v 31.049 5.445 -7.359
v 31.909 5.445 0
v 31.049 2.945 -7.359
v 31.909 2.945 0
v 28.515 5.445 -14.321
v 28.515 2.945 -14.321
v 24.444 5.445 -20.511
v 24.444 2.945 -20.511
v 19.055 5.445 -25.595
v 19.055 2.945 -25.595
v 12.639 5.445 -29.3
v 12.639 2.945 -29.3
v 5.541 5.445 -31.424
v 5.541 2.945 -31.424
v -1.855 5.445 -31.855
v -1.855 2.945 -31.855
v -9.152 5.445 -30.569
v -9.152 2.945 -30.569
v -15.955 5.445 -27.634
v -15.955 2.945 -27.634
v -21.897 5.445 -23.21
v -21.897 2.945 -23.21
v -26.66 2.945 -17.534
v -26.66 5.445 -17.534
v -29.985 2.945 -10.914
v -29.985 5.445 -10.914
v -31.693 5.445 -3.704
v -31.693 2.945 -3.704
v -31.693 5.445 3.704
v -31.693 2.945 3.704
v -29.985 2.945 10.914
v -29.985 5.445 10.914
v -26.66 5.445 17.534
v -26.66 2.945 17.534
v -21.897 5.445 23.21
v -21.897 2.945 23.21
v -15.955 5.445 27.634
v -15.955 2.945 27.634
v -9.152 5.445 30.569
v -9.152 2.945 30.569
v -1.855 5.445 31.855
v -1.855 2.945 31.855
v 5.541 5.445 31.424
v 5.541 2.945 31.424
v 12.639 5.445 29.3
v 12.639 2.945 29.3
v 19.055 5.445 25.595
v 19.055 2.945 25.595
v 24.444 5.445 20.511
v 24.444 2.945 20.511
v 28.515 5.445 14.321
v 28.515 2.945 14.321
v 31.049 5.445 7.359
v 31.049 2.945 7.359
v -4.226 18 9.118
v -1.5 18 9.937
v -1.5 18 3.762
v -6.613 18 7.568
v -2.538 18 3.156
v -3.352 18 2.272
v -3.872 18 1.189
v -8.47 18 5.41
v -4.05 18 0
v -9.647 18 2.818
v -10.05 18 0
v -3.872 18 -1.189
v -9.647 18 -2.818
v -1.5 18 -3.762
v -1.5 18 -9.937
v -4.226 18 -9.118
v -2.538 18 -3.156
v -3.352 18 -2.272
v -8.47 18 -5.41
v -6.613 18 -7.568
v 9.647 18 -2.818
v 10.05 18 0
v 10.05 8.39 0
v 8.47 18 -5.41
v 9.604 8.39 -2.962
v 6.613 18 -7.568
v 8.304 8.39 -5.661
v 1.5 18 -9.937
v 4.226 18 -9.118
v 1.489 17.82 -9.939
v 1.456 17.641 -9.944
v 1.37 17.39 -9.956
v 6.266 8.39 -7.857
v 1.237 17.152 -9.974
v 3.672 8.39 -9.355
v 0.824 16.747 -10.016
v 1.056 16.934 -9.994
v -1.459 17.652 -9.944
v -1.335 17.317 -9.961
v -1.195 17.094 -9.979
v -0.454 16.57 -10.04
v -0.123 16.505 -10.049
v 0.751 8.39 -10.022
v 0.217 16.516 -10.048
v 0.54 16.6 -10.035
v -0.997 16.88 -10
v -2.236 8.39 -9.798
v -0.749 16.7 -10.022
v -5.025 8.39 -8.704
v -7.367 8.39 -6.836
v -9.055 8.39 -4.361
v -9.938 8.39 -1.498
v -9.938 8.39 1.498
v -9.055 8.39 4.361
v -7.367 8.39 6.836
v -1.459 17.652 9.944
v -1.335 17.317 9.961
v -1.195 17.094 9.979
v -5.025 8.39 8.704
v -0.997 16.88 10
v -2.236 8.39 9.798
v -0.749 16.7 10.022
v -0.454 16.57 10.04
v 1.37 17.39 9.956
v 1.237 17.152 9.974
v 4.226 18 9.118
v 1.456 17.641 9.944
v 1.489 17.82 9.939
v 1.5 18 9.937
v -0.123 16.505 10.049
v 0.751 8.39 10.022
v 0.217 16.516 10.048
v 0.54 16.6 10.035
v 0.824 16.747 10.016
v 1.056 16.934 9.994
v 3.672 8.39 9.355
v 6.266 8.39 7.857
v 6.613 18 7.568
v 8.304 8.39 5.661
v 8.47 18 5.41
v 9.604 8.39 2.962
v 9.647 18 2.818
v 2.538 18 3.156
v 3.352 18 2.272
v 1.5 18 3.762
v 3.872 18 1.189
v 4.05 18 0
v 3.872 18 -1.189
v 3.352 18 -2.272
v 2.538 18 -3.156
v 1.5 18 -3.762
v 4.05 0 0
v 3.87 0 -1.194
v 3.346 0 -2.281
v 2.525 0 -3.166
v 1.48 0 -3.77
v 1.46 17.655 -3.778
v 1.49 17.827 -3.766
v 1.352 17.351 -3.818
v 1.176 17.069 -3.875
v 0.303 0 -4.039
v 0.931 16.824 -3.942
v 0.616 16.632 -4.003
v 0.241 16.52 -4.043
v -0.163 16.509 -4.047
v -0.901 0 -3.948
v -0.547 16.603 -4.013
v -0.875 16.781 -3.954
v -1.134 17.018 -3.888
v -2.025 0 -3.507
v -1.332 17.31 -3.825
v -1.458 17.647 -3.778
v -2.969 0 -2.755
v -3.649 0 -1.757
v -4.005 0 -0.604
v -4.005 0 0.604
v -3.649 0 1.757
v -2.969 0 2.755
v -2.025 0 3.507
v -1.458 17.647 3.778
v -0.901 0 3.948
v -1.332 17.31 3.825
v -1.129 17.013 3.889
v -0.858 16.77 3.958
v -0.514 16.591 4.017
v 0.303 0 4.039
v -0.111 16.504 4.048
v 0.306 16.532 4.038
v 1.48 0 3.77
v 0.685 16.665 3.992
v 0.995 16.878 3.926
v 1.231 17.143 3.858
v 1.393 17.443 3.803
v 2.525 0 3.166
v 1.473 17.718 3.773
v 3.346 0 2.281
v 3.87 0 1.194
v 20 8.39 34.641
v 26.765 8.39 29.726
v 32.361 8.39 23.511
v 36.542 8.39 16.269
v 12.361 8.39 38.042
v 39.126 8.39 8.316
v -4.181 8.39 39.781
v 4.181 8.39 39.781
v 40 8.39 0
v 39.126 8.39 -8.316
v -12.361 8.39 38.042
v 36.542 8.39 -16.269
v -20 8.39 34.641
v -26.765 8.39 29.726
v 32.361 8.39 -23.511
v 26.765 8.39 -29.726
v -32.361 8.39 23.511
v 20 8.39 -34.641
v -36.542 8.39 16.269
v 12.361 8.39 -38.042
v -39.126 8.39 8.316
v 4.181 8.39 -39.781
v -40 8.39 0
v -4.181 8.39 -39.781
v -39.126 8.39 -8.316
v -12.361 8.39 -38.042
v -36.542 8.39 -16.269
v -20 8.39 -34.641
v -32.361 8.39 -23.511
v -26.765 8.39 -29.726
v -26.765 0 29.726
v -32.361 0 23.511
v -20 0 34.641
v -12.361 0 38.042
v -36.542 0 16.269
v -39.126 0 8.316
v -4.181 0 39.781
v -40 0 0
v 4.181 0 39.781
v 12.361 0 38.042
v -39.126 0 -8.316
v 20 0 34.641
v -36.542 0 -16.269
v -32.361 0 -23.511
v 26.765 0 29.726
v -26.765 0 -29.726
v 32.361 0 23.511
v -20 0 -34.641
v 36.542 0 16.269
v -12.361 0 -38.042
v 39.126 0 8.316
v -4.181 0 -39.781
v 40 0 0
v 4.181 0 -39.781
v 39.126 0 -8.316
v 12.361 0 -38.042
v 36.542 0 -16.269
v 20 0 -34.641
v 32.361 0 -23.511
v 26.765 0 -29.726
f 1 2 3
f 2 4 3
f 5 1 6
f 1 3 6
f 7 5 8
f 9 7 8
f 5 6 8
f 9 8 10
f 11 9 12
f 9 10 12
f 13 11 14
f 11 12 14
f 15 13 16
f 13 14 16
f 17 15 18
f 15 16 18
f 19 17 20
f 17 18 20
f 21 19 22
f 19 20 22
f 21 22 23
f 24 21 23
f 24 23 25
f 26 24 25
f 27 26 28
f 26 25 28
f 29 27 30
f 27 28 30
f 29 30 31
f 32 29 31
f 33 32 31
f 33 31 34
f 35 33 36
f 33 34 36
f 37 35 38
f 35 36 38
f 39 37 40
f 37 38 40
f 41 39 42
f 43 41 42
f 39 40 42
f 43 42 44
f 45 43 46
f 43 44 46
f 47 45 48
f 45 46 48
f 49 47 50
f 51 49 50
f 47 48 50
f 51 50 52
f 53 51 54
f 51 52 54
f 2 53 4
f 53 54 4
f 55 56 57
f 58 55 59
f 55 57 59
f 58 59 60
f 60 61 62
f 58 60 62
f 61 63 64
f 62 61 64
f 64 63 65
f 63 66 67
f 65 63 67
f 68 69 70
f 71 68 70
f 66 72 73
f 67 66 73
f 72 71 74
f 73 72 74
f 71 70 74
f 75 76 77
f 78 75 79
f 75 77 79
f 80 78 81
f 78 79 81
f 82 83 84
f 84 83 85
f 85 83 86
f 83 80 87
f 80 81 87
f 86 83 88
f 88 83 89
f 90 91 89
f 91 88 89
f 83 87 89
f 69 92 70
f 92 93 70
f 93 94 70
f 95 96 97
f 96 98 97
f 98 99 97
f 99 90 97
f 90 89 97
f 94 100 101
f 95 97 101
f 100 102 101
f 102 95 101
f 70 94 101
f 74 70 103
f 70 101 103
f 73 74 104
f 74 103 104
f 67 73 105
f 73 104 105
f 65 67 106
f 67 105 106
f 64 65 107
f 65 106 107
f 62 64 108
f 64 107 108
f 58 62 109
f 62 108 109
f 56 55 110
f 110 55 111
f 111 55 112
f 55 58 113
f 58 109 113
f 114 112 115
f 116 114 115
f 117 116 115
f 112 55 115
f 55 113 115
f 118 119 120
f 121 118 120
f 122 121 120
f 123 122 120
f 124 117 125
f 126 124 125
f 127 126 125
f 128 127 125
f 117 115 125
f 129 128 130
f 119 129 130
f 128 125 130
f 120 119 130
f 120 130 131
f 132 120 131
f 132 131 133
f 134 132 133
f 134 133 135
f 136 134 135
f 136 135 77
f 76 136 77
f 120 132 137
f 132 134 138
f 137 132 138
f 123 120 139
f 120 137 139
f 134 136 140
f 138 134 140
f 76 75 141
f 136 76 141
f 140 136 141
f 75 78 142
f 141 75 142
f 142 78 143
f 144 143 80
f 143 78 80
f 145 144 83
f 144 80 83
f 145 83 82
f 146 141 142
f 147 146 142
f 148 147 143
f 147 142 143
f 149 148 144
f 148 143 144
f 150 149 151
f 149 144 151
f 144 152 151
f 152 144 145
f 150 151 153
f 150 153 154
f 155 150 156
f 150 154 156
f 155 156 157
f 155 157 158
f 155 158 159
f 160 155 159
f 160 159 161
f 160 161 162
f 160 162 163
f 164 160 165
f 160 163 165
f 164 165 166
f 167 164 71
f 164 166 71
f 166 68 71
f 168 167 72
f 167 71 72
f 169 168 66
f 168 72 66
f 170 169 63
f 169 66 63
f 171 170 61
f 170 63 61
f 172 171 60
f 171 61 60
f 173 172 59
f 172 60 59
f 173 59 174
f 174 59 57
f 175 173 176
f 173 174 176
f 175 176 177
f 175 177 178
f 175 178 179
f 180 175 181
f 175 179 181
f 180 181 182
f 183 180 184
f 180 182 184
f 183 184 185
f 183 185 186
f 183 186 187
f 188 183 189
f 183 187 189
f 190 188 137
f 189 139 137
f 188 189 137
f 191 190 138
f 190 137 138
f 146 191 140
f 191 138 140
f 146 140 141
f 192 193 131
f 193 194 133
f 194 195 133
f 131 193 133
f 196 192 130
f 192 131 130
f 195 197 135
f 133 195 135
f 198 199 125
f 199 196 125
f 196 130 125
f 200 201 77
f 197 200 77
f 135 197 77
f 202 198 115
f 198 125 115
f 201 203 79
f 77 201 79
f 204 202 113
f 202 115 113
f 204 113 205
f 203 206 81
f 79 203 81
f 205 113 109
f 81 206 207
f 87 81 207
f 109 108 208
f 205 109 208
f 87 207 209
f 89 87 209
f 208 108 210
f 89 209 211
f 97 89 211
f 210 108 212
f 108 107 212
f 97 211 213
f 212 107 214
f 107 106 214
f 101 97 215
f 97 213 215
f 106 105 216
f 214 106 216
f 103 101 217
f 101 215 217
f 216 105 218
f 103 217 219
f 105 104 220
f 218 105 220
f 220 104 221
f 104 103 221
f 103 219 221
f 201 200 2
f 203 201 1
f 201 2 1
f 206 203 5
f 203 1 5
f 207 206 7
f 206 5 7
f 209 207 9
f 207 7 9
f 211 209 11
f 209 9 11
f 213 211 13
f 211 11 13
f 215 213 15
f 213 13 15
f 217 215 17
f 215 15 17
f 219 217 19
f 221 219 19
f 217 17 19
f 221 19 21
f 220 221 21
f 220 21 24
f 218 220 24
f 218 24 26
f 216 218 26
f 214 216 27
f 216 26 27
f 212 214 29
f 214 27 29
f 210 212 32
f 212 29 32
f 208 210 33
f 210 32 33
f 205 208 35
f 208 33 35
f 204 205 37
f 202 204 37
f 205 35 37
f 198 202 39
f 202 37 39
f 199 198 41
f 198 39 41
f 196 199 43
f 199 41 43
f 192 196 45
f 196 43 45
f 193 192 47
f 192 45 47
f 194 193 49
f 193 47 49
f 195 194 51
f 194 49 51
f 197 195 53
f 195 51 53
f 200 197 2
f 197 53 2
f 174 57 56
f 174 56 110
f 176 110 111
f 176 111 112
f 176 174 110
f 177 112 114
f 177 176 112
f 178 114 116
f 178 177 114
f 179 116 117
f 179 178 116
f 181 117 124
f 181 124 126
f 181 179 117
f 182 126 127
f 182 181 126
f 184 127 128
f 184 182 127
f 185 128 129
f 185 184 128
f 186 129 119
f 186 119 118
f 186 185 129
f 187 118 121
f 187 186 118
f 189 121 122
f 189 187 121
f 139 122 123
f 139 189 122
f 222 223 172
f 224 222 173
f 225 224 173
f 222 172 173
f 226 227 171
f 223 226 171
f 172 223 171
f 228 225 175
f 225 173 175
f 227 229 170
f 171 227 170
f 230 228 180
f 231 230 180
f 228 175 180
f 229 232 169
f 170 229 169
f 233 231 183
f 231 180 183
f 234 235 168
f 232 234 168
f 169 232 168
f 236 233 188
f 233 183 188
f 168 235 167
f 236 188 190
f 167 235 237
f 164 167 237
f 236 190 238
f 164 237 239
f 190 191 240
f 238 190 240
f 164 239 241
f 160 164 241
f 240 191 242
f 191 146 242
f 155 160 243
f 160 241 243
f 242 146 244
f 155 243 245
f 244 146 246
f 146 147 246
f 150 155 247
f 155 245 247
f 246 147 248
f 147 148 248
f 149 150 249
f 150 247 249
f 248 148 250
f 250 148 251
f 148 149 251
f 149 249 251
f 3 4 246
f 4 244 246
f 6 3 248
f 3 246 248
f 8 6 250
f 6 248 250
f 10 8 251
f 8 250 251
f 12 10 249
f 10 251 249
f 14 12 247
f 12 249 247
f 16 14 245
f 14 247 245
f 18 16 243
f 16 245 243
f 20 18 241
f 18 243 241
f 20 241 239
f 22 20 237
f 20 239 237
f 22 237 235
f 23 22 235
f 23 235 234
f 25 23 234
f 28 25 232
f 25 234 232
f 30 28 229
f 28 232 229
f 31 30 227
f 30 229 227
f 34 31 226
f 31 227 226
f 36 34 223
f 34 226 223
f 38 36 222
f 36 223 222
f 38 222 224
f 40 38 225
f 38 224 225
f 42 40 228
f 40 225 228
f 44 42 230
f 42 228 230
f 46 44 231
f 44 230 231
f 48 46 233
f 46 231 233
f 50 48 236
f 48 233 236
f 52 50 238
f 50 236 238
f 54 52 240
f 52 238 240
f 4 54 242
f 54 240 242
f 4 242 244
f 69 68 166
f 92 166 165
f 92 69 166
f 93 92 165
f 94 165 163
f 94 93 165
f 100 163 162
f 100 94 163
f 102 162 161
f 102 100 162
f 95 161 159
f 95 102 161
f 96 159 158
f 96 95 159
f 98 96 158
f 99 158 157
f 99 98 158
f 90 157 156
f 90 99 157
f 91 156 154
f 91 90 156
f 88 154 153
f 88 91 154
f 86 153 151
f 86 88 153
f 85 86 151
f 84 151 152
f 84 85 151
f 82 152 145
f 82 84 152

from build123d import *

# Parameters (mm, degrees)
CYLINDER_R     = 1.5
CYLINDER_DEPTH = 22


with BuildPart() as cylinder:
    # Cylinder → Cylinder (new body)
    with BuildSketch(Plane(origin=(0, 18, -11), x_dir=(1, 0, 0), z_dir=(0, 0, 1))):
        Circle(CYLINDER_R)
    extrude(amount=CYLINDER_DEPTH)


with BuildPart() as cut:
    # Sketch → Revolve (revolve)
    with BuildSketch(Plane.XY):
        Polygon((4.05, 0), (4.05, 18), (10.05, 18), (10.05, 8.389587), (40, 8.389587), (31.909247, 5.444793), (31.909247, 2.944793), (40, 0), align=None)
    revolve(axis=Axis((0, 0, 0), (0, 1, 0)))

    # Cut: cut Cylinder
    add(cylinder.part, mode=Mode.SUBTRACT)


solid = cut.part
